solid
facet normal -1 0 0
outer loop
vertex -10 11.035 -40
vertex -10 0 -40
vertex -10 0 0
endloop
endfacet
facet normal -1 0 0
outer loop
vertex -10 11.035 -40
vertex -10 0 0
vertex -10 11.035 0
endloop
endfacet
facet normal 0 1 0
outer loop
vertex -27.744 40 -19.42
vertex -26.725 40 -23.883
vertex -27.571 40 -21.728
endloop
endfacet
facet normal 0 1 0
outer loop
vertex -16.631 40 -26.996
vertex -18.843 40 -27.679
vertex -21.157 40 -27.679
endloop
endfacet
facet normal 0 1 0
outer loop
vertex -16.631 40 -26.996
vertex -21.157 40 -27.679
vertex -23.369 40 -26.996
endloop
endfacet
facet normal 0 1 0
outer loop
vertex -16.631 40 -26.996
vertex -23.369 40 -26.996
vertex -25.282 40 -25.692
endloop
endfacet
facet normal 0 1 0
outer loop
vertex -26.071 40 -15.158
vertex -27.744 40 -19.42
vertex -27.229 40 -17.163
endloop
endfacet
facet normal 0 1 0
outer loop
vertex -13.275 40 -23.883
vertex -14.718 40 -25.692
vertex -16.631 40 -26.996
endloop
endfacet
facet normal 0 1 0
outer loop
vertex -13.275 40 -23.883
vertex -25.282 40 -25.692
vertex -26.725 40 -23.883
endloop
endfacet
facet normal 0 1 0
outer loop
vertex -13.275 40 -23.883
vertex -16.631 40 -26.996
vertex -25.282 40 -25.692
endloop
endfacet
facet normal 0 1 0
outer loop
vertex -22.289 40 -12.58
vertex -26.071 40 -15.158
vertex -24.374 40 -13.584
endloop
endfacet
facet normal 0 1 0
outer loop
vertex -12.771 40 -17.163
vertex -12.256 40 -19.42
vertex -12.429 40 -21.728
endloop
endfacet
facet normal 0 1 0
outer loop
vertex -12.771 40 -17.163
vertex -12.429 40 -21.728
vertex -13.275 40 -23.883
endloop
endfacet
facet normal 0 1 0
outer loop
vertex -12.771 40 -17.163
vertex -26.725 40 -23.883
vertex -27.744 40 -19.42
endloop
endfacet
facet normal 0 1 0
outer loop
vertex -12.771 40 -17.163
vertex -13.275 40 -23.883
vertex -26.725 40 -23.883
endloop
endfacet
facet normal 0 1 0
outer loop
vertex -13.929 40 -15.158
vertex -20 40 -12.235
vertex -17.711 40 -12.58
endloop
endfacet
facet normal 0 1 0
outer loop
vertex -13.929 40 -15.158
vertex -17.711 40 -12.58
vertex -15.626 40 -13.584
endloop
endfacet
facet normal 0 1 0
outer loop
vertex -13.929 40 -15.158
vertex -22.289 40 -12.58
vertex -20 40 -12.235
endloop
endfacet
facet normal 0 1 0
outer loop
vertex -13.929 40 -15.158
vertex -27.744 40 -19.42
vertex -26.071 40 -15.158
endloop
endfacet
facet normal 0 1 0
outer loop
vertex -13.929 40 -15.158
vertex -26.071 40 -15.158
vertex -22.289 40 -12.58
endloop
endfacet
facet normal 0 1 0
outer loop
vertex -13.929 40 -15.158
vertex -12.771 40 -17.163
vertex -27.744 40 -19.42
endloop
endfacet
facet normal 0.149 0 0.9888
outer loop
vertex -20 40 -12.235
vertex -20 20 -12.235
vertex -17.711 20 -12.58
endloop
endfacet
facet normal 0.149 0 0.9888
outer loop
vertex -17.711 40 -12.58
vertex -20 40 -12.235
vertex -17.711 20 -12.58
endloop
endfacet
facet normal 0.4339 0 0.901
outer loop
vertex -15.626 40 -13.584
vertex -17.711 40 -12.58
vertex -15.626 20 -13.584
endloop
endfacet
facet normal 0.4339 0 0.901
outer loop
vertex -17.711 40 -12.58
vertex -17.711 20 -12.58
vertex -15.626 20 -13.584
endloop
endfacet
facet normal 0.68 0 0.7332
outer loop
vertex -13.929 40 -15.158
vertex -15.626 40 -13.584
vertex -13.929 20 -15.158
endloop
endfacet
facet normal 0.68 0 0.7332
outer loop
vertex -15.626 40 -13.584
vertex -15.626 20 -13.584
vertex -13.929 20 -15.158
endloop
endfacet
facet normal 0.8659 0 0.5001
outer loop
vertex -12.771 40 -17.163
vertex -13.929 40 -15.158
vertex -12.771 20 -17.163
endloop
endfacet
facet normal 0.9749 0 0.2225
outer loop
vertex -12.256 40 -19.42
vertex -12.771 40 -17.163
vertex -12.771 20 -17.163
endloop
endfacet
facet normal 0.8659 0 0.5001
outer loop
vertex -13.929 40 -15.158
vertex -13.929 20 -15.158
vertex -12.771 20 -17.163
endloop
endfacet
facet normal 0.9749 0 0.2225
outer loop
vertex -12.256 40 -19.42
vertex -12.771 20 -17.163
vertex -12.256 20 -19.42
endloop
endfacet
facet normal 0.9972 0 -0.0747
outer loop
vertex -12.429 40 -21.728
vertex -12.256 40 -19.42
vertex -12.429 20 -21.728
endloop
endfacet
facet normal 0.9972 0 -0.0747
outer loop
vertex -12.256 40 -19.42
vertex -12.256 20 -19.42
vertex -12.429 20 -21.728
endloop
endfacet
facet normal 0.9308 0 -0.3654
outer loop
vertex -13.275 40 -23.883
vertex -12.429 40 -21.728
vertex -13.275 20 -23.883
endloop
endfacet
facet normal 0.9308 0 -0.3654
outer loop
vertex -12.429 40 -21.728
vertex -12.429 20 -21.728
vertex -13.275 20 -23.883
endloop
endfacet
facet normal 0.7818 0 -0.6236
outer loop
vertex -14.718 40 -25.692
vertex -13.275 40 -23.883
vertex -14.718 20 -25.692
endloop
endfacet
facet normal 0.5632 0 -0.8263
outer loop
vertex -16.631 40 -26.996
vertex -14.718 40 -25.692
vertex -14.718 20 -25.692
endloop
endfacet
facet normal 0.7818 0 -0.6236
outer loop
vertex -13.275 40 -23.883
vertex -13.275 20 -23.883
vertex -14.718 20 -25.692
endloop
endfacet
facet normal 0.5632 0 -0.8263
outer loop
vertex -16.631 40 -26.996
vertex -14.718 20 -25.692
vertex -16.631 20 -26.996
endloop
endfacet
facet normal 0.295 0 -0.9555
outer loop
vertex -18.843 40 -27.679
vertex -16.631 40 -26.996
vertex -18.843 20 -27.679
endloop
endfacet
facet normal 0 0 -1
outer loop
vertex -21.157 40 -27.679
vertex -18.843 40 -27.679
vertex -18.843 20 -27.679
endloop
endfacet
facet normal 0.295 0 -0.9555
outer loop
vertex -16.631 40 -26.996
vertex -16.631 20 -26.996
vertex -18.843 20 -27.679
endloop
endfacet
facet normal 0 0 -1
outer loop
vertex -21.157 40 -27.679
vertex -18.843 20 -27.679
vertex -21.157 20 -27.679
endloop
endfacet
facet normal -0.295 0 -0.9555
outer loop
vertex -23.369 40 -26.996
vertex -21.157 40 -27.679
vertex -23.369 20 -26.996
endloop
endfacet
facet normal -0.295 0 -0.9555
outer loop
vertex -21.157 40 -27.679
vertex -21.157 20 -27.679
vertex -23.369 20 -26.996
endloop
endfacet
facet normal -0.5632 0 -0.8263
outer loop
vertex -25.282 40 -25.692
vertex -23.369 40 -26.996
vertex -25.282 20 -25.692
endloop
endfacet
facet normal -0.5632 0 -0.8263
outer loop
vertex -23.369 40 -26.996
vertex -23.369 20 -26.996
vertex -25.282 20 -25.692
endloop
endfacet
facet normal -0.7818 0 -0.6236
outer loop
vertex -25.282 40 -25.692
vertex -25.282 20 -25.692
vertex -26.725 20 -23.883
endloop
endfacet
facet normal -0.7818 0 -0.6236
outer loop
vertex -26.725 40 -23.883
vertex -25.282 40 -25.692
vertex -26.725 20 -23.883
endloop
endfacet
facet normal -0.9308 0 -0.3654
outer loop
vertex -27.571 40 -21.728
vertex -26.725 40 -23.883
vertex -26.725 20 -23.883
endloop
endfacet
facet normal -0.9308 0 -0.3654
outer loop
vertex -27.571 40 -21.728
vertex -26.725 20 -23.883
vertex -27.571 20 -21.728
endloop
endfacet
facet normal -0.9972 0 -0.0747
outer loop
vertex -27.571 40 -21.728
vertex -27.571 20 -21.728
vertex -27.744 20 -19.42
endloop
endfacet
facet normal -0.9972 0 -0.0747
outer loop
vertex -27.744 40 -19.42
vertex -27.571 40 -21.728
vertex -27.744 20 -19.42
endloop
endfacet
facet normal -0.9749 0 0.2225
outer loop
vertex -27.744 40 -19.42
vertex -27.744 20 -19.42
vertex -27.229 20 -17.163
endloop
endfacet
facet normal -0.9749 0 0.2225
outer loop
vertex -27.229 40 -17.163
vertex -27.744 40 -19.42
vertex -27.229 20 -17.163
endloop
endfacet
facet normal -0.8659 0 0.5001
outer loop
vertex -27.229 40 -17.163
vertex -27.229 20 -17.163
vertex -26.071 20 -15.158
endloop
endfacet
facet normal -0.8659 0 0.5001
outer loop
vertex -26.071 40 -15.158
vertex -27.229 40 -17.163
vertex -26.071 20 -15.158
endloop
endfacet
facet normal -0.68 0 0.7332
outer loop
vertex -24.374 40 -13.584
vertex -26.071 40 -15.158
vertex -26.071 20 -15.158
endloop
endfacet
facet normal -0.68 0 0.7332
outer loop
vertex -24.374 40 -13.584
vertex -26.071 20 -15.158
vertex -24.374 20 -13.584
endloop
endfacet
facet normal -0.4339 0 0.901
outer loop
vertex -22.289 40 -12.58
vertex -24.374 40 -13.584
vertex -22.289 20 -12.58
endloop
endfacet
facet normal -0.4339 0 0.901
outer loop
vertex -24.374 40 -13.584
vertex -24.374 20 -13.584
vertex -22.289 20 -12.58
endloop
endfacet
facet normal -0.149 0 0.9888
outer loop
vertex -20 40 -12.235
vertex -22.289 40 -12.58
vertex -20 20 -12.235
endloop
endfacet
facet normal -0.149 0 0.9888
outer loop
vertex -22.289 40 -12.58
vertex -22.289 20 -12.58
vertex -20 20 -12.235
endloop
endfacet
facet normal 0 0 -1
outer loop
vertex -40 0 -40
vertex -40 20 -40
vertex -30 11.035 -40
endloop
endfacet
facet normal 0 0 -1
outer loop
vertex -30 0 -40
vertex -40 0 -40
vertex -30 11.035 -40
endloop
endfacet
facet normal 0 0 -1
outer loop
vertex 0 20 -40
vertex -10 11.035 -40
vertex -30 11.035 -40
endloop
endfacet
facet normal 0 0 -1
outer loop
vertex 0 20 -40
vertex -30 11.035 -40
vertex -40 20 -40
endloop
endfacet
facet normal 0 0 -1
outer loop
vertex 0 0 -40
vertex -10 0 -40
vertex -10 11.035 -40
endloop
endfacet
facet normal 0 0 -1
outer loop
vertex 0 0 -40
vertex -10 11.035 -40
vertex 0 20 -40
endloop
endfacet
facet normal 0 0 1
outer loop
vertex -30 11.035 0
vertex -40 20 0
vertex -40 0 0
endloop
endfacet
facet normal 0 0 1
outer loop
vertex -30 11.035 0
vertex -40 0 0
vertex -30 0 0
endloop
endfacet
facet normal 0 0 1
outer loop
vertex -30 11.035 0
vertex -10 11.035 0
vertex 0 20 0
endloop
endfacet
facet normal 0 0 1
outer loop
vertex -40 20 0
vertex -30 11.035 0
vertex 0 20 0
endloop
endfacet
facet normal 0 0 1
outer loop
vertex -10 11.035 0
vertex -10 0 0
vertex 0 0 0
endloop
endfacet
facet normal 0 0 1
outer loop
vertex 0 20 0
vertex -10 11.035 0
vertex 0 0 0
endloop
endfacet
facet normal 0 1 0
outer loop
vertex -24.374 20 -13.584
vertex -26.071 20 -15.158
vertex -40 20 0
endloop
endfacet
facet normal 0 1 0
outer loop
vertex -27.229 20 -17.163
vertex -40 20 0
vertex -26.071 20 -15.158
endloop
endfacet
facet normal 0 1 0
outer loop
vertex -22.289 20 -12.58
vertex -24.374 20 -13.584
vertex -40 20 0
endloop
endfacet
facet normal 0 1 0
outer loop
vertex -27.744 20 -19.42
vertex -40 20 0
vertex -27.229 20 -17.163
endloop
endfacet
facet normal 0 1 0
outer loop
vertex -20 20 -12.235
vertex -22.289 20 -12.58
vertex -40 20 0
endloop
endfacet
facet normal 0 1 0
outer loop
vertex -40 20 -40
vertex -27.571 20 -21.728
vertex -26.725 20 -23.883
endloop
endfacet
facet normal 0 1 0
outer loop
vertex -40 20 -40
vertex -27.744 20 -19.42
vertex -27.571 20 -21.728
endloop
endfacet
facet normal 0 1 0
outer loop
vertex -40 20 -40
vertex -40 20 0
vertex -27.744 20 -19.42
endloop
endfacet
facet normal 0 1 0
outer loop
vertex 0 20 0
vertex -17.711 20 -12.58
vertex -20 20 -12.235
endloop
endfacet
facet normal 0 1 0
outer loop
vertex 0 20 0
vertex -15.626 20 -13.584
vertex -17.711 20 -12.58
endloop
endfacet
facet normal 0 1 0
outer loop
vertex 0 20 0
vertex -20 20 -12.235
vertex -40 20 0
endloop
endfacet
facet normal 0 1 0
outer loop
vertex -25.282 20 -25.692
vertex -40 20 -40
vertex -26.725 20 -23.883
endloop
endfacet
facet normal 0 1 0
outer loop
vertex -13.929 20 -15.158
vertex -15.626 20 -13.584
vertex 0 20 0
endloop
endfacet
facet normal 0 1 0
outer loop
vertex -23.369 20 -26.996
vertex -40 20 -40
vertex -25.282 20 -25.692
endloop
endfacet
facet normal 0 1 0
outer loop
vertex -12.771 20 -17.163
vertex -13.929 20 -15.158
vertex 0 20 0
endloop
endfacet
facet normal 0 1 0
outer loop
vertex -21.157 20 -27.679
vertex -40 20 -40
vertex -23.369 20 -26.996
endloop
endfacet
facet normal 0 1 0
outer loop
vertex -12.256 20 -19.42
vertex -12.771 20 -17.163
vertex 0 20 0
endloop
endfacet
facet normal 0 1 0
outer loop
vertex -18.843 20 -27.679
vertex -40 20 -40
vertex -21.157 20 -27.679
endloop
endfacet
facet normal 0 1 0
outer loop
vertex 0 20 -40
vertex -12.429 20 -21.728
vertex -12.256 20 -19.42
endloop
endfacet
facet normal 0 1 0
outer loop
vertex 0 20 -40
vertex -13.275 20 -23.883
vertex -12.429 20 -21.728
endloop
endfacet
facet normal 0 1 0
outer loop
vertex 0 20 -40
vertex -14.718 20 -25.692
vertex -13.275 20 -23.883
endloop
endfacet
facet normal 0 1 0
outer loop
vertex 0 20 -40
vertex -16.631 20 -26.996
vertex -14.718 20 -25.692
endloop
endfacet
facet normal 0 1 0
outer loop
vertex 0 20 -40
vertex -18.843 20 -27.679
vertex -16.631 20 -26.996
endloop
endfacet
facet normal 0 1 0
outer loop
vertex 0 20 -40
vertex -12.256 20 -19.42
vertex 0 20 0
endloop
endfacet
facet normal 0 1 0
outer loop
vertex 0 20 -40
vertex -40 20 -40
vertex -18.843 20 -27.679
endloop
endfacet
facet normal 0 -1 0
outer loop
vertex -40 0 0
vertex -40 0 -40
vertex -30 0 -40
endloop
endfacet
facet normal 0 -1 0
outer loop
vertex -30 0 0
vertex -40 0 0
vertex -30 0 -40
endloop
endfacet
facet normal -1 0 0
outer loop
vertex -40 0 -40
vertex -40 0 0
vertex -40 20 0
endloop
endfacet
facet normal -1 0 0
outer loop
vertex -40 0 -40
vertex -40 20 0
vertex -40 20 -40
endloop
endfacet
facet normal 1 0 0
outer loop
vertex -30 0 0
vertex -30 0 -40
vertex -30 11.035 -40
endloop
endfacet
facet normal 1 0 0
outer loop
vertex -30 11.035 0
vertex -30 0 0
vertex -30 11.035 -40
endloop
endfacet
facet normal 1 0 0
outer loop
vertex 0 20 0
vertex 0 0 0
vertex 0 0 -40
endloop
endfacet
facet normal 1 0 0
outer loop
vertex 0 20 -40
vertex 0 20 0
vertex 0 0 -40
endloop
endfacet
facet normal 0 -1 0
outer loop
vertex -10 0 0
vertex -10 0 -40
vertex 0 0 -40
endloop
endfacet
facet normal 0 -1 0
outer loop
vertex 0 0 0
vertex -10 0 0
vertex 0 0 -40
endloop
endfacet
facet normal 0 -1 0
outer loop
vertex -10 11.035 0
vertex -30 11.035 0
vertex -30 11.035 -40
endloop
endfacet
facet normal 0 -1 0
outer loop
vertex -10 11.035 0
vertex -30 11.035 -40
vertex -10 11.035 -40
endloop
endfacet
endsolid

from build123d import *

# Parameters (mm, degrees)
SKETCH1_W           = 40
SKETCH1_H           = 40
BOSS_EXTRUDE1_DEPTH = 20
SKETCH2_W           = 20
SKETCH2_H           = 11.035436779
CUT_EXTRUDE1_DEPTH  = 61
SKETCH3_R           = 7.76528749
BOSS_EXTRUDE2_DEPTH = 20


with BuildPart() as part:
    # Sketch1 → Boss-Extrude1 (new body)
    with BuildSketch(Plane(origin=(0, 0, 0), x_dir=(1, 0, 0), z_dir=(0, 1, 0))):
        with Locations((-20, 20)):
            Rectangle(SKETCH1_W, SKETCH1_H)
    extrude(amount=BOSS_EXTRUDE1_DEPTH)

    # Sketch2 → Cut-Extrude1 (cut, through all)
    with BuildSketch(Plane.XY):
        with Locations((-20, 5.51771839)):
            Rectangle(SKETCH2_W, SKETCH2_H)
    extrude(amount=-CUT_EXTRUDE1_DEPTH, mode=Mode.SUBTRACT)

    # Sketch3 → Boss-Extrude2 (add)
    with BuildSketch(Plane(origin=(0, 20, 0), x_dir=(1, 0, 0), z_dir=(0, 1, 0))):
        with Locations(Location((-20, 20, 0), (0, 0, 270))):
            Circle(SKETCH3_R)
    extrude(amount=BOSS_EXTRUDE2_DEPTH)


solid = part.part
